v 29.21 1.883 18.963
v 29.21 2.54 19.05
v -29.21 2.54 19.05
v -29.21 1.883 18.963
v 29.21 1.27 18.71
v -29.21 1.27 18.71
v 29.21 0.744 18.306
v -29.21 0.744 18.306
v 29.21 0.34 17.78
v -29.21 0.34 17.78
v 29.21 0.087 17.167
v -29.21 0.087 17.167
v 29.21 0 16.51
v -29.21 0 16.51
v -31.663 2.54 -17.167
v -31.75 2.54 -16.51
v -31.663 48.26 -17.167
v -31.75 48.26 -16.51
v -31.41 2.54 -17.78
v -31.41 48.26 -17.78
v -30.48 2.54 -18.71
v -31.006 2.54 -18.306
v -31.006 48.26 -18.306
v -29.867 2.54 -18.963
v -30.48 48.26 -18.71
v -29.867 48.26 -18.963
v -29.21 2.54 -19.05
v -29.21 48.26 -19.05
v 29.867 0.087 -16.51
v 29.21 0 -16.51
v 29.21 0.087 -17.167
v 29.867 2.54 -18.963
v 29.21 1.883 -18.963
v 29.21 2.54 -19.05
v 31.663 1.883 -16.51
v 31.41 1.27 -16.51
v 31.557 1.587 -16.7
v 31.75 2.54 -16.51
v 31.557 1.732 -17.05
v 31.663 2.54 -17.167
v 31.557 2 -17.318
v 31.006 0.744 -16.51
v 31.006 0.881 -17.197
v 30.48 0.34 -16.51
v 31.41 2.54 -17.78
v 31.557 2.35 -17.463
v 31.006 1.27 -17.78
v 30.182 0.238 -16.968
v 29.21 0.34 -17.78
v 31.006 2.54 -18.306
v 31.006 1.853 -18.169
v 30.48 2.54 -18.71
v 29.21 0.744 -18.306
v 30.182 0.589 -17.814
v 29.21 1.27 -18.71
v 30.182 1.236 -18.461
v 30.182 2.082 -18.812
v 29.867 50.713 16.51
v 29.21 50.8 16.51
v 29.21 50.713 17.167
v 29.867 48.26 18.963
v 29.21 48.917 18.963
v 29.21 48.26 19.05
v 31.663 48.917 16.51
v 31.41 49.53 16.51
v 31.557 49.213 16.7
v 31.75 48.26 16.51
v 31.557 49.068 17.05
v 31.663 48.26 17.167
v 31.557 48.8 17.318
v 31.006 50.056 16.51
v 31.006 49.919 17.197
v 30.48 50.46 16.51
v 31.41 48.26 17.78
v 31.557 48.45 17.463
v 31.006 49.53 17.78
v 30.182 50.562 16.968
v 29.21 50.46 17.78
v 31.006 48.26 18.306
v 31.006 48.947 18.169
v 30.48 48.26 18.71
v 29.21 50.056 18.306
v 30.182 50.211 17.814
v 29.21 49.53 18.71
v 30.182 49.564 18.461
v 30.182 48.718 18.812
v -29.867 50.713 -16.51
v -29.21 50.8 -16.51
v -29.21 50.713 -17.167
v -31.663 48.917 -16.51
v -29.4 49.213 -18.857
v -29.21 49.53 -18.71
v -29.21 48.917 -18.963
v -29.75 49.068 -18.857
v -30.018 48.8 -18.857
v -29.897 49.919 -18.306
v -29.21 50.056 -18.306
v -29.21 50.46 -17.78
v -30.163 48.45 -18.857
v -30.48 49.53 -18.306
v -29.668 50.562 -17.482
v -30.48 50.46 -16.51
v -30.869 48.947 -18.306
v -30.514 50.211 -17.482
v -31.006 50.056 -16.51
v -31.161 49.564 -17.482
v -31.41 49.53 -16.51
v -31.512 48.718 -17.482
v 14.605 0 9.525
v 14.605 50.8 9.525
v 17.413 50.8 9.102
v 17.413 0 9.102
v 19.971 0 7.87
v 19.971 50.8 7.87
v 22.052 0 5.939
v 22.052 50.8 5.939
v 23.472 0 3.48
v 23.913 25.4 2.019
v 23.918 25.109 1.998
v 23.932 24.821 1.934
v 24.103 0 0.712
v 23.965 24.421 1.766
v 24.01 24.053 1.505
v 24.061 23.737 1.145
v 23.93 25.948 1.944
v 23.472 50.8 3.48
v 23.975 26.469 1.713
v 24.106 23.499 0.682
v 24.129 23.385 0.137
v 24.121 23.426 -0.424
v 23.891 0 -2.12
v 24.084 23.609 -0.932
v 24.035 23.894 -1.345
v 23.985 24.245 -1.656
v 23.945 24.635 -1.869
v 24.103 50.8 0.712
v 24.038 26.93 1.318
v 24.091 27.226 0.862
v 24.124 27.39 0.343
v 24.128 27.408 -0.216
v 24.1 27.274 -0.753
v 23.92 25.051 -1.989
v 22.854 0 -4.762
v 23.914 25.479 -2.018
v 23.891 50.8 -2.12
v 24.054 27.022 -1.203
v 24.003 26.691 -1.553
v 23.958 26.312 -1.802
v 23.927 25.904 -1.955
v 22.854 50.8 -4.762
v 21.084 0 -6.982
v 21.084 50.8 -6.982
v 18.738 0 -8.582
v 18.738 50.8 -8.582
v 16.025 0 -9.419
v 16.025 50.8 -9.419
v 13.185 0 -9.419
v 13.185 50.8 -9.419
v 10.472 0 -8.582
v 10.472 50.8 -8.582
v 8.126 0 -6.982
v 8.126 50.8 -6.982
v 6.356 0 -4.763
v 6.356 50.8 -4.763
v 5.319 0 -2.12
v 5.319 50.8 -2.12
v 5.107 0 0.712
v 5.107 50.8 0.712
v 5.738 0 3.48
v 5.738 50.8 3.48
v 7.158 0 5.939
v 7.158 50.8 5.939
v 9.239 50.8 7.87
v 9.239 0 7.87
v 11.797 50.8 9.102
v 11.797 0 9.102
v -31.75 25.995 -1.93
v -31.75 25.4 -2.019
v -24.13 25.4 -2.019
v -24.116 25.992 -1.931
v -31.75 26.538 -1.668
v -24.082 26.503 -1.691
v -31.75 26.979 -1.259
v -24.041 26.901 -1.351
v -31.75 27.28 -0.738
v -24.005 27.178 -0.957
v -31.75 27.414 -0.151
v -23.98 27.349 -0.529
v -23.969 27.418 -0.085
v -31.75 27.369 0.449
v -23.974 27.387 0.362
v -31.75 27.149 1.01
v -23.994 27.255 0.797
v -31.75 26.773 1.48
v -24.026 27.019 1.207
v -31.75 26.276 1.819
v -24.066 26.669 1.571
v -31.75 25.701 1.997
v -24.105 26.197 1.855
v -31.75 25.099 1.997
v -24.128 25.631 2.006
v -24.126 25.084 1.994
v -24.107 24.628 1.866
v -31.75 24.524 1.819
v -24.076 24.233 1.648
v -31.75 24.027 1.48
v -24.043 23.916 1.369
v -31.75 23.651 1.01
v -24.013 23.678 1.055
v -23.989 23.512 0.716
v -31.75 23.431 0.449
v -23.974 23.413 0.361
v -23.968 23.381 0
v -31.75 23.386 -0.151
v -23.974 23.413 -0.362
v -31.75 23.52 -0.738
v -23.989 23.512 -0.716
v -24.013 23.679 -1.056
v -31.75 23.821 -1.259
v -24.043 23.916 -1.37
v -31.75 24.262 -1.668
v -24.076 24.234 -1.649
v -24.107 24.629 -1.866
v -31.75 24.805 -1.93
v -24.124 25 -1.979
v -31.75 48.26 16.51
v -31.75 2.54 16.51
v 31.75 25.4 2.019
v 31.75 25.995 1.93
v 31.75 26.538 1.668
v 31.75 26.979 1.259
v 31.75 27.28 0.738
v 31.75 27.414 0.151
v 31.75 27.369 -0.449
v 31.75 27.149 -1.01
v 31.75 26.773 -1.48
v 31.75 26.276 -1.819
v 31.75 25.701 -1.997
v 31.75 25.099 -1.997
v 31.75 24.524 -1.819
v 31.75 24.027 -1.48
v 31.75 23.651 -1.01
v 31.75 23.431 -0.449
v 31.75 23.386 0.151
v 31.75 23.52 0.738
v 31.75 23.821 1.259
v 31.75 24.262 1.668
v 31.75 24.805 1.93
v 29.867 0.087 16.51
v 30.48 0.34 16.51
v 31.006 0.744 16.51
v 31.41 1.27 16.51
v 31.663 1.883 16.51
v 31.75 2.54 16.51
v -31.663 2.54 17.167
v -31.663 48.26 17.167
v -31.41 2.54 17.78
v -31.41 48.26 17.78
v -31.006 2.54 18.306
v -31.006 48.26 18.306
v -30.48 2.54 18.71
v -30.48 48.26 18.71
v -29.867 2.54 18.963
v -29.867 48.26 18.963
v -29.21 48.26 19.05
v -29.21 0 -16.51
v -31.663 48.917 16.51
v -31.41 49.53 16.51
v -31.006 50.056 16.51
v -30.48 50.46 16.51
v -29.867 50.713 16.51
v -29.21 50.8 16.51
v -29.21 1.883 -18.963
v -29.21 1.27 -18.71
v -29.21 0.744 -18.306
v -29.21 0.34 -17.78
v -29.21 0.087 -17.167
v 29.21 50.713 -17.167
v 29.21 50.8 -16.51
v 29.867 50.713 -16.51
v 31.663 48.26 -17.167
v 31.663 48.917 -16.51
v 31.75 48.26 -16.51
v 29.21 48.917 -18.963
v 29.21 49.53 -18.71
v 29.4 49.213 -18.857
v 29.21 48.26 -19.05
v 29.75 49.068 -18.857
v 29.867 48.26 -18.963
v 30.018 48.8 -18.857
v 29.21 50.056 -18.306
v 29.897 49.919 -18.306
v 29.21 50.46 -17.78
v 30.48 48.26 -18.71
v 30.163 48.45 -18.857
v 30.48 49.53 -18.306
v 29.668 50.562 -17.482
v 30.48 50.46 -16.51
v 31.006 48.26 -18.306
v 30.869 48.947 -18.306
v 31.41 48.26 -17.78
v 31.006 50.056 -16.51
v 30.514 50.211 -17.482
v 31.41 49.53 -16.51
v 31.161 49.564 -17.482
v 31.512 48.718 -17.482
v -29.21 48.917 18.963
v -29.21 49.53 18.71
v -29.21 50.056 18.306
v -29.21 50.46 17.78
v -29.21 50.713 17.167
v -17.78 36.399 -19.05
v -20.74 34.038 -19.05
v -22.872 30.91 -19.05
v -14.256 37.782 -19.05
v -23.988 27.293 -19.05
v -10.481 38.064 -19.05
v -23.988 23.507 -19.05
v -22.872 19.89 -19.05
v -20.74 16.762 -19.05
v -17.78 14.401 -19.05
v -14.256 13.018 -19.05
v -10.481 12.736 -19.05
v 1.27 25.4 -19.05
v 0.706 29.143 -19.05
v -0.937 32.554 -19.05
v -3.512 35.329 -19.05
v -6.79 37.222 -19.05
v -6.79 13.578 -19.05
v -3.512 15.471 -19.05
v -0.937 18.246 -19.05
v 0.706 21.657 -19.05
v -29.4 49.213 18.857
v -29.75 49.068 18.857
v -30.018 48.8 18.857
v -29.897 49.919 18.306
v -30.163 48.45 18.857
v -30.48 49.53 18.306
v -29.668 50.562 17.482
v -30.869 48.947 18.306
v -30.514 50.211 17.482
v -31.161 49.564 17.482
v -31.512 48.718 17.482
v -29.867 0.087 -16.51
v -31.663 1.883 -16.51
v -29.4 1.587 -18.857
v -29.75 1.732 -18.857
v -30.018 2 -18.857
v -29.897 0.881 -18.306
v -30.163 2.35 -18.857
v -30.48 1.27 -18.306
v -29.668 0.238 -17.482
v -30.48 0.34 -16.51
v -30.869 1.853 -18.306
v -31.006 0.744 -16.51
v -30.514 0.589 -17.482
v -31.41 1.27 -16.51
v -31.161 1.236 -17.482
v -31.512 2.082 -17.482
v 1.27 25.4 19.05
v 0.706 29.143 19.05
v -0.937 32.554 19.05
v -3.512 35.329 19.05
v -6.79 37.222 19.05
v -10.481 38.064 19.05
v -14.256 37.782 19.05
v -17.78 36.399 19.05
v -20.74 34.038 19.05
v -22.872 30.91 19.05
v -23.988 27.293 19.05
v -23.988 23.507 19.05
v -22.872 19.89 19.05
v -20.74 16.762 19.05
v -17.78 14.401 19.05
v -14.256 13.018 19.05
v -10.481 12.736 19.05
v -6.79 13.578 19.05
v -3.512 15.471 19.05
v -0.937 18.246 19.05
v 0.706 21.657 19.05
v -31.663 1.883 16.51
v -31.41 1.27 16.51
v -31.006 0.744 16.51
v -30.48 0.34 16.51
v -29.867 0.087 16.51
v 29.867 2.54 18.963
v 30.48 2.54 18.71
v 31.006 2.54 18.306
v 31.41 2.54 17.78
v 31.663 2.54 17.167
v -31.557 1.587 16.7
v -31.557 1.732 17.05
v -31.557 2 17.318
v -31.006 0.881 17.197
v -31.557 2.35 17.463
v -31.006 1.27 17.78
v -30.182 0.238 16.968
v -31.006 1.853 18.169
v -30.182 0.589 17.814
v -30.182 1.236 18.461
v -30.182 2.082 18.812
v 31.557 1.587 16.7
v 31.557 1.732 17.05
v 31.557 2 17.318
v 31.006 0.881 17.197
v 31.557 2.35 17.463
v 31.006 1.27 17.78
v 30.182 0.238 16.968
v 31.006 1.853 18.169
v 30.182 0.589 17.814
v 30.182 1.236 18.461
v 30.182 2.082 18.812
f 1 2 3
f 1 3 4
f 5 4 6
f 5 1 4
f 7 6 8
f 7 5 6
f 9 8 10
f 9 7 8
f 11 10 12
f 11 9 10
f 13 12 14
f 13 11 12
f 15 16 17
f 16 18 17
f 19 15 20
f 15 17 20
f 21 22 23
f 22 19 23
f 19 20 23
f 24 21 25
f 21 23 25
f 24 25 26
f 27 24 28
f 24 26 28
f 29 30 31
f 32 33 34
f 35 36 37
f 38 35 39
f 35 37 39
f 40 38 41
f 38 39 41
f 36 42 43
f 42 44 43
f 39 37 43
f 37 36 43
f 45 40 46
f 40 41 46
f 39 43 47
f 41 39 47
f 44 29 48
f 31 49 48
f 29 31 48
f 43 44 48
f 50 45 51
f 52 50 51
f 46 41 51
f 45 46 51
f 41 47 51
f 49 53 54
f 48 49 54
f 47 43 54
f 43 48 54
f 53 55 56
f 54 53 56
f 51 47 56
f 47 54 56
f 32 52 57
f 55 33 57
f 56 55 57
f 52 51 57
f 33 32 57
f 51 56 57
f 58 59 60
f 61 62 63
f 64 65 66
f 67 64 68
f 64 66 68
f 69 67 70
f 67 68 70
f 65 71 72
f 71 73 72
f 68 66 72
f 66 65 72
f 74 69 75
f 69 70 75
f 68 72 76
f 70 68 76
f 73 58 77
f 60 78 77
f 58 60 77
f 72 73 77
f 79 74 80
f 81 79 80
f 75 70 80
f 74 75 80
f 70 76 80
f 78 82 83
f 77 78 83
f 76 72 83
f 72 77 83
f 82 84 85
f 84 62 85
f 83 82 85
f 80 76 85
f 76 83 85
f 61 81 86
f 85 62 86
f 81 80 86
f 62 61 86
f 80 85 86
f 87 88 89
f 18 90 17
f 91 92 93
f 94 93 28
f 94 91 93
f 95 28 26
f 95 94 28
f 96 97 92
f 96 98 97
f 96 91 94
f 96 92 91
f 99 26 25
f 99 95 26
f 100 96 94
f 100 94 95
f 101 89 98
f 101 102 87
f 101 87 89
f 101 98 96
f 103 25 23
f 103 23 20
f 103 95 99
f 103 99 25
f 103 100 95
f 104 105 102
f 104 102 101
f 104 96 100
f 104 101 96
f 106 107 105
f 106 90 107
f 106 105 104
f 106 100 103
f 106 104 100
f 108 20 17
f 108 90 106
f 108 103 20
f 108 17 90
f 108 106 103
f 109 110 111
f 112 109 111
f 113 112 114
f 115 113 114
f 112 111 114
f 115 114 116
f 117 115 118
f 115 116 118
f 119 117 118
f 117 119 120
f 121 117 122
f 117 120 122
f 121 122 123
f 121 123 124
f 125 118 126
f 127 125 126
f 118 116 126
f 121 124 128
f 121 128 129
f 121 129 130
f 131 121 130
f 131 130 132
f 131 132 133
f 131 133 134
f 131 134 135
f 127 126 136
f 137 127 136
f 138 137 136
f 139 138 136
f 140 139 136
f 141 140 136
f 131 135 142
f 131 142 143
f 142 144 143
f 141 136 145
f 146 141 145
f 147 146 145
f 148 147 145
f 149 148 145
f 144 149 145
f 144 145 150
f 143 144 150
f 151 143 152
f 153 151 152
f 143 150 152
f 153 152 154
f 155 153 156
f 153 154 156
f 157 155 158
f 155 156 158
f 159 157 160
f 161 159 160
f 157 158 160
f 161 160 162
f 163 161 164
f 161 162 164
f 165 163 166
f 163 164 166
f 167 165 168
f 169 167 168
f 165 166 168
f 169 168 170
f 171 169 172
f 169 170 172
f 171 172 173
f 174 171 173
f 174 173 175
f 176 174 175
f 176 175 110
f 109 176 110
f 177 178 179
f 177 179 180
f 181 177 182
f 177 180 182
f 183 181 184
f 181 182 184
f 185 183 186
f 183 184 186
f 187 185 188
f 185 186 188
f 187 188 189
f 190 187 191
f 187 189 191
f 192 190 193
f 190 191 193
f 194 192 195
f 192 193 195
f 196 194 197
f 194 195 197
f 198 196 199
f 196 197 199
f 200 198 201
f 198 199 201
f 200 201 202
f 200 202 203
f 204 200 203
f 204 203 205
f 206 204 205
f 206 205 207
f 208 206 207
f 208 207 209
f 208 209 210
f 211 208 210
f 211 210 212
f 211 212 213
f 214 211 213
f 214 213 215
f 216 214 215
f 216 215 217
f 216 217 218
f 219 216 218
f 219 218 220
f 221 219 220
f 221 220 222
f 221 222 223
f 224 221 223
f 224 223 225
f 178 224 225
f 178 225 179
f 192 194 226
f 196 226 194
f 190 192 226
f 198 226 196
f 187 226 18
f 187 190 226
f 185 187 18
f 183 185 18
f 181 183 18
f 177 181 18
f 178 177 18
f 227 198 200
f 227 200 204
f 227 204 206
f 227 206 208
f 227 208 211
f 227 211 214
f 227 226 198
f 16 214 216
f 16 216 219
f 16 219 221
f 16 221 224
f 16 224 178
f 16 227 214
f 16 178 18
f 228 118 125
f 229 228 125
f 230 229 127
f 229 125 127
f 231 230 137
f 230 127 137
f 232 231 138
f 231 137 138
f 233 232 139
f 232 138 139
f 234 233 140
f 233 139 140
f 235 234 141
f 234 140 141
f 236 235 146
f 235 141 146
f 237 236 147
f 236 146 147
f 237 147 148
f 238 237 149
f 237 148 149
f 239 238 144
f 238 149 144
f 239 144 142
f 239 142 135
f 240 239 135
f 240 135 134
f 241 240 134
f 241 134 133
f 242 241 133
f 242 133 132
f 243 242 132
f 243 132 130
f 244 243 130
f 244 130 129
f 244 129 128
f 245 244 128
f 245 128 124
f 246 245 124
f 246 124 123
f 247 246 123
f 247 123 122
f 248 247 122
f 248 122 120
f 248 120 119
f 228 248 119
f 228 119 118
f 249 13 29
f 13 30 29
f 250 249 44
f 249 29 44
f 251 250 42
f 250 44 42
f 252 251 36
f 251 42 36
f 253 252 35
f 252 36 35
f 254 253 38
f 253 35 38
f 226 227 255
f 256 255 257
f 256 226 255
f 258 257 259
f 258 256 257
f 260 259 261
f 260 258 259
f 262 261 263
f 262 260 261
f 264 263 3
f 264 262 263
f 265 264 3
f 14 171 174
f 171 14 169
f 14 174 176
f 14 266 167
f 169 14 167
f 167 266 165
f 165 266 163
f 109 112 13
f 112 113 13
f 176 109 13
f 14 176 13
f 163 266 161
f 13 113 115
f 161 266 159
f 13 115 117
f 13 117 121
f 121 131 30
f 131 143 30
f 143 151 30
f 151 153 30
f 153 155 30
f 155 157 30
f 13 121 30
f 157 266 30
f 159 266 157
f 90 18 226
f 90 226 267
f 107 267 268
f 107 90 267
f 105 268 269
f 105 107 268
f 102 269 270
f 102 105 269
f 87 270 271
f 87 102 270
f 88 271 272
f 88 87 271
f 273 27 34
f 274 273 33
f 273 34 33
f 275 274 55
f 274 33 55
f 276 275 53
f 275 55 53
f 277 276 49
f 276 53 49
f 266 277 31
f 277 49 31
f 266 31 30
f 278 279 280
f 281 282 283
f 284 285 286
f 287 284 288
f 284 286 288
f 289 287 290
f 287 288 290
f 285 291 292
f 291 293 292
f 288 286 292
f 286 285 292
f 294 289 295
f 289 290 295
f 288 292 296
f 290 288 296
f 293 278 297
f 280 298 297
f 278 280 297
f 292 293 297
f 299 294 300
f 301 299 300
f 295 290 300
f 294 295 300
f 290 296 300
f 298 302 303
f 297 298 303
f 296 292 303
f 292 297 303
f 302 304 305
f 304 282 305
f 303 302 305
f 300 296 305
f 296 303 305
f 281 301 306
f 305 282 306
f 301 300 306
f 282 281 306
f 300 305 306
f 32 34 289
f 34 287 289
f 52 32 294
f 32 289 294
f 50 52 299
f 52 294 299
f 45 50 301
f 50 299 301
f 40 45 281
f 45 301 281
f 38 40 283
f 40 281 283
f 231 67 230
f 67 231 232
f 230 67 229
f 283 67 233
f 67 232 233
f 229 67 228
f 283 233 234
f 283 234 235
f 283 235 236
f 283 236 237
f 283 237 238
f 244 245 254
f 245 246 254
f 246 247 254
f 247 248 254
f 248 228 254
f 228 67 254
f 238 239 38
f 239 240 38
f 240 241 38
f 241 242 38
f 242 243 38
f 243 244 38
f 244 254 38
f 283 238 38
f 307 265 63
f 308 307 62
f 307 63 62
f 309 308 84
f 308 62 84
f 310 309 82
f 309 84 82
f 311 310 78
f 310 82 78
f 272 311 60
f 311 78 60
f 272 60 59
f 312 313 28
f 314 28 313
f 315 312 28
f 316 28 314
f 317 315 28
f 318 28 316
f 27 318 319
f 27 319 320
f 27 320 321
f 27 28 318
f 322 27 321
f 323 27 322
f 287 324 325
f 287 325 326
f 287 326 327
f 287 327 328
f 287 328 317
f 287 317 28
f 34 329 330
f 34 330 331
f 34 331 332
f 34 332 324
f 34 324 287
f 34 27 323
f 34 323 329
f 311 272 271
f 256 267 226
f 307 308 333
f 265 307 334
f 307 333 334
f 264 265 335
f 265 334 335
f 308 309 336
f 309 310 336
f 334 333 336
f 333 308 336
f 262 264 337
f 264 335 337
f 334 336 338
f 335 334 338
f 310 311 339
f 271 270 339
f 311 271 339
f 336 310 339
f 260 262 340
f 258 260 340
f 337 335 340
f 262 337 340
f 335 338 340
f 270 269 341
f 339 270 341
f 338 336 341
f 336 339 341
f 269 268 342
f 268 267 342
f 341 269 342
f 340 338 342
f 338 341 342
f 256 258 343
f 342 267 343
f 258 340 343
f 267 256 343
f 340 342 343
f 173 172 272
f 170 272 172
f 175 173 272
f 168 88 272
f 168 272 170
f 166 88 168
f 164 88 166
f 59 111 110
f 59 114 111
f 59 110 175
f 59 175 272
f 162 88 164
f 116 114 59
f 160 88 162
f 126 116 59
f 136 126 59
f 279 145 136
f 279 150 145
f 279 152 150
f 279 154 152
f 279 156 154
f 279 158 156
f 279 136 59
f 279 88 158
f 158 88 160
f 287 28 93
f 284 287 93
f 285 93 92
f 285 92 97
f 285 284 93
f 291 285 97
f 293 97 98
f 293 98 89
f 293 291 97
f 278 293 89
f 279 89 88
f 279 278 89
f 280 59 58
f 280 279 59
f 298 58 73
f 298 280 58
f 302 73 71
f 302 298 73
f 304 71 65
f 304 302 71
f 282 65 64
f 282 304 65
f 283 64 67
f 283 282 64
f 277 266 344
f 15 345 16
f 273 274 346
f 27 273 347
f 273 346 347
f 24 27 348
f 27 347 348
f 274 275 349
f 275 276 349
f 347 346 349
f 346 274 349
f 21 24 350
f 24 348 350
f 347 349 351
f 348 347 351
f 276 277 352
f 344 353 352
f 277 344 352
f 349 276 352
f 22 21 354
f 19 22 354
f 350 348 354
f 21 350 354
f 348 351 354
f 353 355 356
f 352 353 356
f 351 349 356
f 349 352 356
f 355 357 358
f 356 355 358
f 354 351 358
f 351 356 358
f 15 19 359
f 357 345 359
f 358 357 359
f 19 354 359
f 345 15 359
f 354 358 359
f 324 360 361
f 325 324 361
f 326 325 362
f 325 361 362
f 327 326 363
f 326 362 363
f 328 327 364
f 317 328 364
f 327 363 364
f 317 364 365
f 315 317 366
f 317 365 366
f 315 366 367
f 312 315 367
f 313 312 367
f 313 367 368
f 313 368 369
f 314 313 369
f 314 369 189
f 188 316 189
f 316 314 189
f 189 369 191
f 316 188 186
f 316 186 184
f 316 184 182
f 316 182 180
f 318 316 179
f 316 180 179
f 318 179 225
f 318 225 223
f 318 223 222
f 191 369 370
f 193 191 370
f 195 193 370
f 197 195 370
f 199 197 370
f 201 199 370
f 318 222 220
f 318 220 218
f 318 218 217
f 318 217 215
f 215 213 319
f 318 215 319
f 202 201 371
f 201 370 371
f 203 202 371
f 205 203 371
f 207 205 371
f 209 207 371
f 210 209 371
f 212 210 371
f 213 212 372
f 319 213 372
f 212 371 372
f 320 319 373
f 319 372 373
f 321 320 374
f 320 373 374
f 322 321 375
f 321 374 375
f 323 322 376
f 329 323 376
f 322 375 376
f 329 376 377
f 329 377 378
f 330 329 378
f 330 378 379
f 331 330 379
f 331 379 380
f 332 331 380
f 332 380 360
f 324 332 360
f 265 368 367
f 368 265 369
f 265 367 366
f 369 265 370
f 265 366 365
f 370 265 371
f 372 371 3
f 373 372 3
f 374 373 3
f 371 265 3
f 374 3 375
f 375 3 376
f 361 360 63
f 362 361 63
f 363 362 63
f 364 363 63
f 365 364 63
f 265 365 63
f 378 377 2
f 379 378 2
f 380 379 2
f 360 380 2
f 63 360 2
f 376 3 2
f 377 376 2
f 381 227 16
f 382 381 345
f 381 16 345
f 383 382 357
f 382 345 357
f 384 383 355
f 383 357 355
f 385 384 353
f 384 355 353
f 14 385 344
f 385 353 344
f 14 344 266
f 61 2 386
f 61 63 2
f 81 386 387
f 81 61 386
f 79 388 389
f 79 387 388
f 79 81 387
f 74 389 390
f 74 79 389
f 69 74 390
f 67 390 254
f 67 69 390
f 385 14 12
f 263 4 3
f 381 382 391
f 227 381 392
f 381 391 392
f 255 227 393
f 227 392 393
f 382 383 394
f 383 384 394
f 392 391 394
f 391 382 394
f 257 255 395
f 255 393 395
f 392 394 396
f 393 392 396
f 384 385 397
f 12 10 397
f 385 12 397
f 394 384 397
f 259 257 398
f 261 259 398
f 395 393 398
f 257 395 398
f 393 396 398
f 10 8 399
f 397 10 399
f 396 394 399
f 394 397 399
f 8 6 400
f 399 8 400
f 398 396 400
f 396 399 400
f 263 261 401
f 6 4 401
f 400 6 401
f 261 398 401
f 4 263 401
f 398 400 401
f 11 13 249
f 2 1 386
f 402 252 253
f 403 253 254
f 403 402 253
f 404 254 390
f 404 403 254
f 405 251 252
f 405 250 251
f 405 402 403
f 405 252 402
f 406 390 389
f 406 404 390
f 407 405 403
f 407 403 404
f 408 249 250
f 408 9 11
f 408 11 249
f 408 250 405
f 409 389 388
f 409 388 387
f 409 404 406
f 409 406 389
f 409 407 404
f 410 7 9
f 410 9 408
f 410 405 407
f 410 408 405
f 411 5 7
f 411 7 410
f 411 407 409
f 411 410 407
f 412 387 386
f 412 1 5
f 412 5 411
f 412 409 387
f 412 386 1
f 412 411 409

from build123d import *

# Parameters (mm, degrees)
CROQUIS1_W                   = 63.5
CROQUIS1_H                   = 38.1
SALIENTE_EXTRUIR1_DEPTH      = 50.8
CROQUIS2_R                   = 12.7
CORTAR_EXTRUIR1_DEPTH        = 63.5
CROQUIS3_R                   = 9.525
CORTAR_EXTRUIR2_DEPTH        = 63.5
REDONDEO1_R                  = 2.54
TALADRO_ROSCADO_10_322_D     = 4.0386
TALADRO_ROSCADO_10_322_DEPTH = 13.6144
TALADRO_ROSCADO_10_322_TIP   = 1.213317848
TALADRO_ROSCADO_10_321_D     = 4.0386
TALADRO_ROSCADO_10_321_DEPTH = 13.6144
TALADRO_ROSCADO_10_321_TIP   = 1.213317848


with BuildPart() as part:
    # Croquis1 → Saliente-Extruir1 (new body)
    with BuildSketch(Plane(origin=(0, 0, 0), x_dir=(1, 0, 0), z_dir=(0, 1, 0))):
        Rectangle(CROQUIS1_W, CROQUIS1_H)
    extrude(amount=SALIENTE_EXTRUIR1_DEPTH)

    # Croquis2 → Cortar-Extruir1 (cut)
    with BuildSketch(Plane.XY.offset(19.05)):
        with Locations((-11.43, 25.4)):
            Circle(CROQUIS2_R)
    extrude(amount=-CORTAR_EXTRUIR1_DEPTH, mode=Mode.SUBTRACT)

    # Croquis3 → Cortar-Extruir2 (cut)
    with BuildSketch(Plane(origin=(0, 50.8, 0), x_dir=(1, 0, 0), z_dir=(0, 1, 0))):
        with Locations(Location((14.605, 0, 0), (0, 0, 270))):
            Circle(CROQUIS3_R)
    extrude(amount=-CORTAR_EXTRUIR2_DEPTH, mode=Mode.SUBTRACT)

    # Redondeo1
    redondeo1_edges = [part.edges().sort_by_distance(p)[0] for p in [
        (-31.75, 50.8, 0),
        (0, 50.8, 19.05),
        (31.75, 50.8, 0),
        (0, 0, 19.05),
        (-31.75, 0, 0),
        (0, 0, -19.05),
        (31.75, 0, 0),
        (0, 50.8, -19.05),
        (31.75, 25.4, 19.05),
        (-31.75, 25.4, 19.05),
        (-31.75, 25.4, -19.05),
        (31.75, 25.4, -19.05),
    ]]
    fillet(redondeo1_edges, radius=REDONDEO1_R)

    # Taladro roscado #10-322
    with Locations(Plane(origin=(31.75, 0, 0), x_dir=(0, 0, -1), z_dir=(1, 0, 0))):
        with Locations((0, 25.4)):
            Hole(TALADRO_ROSCADO_10_322_D / 2, depth=TALADRO_ROSCADO_10_322_DEPTH)
            with Locations((0, 0, -(TALADRO_ROSCADO_10_322_DEPTH + TALADRO_ROSCADO_10_322_TIP / 2))):  # 118° drill point
                Cone(0, TALADRO_ROSCADO_10_322_D / 2, TALADRO_ROSCADO_10_322_TIP, mode=Mode.SUBTRACT)

    # Taladro roscado #10-321
    with Locations(Plane.ZY.offset(31.75)):
        with Locations((0, 25.4)):
            Hole(TALADRO_ROSCADO_10_321_D / 2, depth=TALADRO_ROSCADO_10_321_DEPTH)
            with Locations((0, 0, -(TALADRO_ROSCADO_10_321_DEPTH + TALADRO_ROSCADO_10_321_TIP / 2))):  # 118° drill point
                Cone(0, TALADRO_ROSCADO_10_321_D / 2, TALADRO_ROSCADO_10_321_TIP, mode=Mode.SUBTRACT)


solid = part.part
